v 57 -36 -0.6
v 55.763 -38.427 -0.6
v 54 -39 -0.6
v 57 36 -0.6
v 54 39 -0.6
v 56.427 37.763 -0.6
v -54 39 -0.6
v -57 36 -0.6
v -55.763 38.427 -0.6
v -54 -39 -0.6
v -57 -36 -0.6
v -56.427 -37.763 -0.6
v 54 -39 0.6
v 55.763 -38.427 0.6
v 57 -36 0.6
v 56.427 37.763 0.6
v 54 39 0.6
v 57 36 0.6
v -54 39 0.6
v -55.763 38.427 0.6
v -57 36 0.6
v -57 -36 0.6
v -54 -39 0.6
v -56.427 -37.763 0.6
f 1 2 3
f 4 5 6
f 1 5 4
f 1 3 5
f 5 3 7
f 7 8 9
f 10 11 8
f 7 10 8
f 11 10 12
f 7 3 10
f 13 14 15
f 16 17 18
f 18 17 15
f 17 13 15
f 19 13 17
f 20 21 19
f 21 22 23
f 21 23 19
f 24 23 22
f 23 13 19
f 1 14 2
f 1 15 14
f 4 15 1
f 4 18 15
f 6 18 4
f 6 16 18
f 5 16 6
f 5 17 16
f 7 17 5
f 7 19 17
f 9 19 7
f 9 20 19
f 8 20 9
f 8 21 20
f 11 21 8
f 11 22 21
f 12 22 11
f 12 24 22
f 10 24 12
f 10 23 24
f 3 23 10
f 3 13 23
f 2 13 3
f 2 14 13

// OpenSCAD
module insert() {
    // definitions
    x_box = 114;
    y_box = 78;
    h_layer = 0.24;
    thick = h_layer*5;
    fillet = 3;

    // model
    linear_extrude(thick, center = true)
    offset(r = +fillet) offset(delta = -fillet) {
        square([x_box, y_box], center = true);
    }
}


insert();
